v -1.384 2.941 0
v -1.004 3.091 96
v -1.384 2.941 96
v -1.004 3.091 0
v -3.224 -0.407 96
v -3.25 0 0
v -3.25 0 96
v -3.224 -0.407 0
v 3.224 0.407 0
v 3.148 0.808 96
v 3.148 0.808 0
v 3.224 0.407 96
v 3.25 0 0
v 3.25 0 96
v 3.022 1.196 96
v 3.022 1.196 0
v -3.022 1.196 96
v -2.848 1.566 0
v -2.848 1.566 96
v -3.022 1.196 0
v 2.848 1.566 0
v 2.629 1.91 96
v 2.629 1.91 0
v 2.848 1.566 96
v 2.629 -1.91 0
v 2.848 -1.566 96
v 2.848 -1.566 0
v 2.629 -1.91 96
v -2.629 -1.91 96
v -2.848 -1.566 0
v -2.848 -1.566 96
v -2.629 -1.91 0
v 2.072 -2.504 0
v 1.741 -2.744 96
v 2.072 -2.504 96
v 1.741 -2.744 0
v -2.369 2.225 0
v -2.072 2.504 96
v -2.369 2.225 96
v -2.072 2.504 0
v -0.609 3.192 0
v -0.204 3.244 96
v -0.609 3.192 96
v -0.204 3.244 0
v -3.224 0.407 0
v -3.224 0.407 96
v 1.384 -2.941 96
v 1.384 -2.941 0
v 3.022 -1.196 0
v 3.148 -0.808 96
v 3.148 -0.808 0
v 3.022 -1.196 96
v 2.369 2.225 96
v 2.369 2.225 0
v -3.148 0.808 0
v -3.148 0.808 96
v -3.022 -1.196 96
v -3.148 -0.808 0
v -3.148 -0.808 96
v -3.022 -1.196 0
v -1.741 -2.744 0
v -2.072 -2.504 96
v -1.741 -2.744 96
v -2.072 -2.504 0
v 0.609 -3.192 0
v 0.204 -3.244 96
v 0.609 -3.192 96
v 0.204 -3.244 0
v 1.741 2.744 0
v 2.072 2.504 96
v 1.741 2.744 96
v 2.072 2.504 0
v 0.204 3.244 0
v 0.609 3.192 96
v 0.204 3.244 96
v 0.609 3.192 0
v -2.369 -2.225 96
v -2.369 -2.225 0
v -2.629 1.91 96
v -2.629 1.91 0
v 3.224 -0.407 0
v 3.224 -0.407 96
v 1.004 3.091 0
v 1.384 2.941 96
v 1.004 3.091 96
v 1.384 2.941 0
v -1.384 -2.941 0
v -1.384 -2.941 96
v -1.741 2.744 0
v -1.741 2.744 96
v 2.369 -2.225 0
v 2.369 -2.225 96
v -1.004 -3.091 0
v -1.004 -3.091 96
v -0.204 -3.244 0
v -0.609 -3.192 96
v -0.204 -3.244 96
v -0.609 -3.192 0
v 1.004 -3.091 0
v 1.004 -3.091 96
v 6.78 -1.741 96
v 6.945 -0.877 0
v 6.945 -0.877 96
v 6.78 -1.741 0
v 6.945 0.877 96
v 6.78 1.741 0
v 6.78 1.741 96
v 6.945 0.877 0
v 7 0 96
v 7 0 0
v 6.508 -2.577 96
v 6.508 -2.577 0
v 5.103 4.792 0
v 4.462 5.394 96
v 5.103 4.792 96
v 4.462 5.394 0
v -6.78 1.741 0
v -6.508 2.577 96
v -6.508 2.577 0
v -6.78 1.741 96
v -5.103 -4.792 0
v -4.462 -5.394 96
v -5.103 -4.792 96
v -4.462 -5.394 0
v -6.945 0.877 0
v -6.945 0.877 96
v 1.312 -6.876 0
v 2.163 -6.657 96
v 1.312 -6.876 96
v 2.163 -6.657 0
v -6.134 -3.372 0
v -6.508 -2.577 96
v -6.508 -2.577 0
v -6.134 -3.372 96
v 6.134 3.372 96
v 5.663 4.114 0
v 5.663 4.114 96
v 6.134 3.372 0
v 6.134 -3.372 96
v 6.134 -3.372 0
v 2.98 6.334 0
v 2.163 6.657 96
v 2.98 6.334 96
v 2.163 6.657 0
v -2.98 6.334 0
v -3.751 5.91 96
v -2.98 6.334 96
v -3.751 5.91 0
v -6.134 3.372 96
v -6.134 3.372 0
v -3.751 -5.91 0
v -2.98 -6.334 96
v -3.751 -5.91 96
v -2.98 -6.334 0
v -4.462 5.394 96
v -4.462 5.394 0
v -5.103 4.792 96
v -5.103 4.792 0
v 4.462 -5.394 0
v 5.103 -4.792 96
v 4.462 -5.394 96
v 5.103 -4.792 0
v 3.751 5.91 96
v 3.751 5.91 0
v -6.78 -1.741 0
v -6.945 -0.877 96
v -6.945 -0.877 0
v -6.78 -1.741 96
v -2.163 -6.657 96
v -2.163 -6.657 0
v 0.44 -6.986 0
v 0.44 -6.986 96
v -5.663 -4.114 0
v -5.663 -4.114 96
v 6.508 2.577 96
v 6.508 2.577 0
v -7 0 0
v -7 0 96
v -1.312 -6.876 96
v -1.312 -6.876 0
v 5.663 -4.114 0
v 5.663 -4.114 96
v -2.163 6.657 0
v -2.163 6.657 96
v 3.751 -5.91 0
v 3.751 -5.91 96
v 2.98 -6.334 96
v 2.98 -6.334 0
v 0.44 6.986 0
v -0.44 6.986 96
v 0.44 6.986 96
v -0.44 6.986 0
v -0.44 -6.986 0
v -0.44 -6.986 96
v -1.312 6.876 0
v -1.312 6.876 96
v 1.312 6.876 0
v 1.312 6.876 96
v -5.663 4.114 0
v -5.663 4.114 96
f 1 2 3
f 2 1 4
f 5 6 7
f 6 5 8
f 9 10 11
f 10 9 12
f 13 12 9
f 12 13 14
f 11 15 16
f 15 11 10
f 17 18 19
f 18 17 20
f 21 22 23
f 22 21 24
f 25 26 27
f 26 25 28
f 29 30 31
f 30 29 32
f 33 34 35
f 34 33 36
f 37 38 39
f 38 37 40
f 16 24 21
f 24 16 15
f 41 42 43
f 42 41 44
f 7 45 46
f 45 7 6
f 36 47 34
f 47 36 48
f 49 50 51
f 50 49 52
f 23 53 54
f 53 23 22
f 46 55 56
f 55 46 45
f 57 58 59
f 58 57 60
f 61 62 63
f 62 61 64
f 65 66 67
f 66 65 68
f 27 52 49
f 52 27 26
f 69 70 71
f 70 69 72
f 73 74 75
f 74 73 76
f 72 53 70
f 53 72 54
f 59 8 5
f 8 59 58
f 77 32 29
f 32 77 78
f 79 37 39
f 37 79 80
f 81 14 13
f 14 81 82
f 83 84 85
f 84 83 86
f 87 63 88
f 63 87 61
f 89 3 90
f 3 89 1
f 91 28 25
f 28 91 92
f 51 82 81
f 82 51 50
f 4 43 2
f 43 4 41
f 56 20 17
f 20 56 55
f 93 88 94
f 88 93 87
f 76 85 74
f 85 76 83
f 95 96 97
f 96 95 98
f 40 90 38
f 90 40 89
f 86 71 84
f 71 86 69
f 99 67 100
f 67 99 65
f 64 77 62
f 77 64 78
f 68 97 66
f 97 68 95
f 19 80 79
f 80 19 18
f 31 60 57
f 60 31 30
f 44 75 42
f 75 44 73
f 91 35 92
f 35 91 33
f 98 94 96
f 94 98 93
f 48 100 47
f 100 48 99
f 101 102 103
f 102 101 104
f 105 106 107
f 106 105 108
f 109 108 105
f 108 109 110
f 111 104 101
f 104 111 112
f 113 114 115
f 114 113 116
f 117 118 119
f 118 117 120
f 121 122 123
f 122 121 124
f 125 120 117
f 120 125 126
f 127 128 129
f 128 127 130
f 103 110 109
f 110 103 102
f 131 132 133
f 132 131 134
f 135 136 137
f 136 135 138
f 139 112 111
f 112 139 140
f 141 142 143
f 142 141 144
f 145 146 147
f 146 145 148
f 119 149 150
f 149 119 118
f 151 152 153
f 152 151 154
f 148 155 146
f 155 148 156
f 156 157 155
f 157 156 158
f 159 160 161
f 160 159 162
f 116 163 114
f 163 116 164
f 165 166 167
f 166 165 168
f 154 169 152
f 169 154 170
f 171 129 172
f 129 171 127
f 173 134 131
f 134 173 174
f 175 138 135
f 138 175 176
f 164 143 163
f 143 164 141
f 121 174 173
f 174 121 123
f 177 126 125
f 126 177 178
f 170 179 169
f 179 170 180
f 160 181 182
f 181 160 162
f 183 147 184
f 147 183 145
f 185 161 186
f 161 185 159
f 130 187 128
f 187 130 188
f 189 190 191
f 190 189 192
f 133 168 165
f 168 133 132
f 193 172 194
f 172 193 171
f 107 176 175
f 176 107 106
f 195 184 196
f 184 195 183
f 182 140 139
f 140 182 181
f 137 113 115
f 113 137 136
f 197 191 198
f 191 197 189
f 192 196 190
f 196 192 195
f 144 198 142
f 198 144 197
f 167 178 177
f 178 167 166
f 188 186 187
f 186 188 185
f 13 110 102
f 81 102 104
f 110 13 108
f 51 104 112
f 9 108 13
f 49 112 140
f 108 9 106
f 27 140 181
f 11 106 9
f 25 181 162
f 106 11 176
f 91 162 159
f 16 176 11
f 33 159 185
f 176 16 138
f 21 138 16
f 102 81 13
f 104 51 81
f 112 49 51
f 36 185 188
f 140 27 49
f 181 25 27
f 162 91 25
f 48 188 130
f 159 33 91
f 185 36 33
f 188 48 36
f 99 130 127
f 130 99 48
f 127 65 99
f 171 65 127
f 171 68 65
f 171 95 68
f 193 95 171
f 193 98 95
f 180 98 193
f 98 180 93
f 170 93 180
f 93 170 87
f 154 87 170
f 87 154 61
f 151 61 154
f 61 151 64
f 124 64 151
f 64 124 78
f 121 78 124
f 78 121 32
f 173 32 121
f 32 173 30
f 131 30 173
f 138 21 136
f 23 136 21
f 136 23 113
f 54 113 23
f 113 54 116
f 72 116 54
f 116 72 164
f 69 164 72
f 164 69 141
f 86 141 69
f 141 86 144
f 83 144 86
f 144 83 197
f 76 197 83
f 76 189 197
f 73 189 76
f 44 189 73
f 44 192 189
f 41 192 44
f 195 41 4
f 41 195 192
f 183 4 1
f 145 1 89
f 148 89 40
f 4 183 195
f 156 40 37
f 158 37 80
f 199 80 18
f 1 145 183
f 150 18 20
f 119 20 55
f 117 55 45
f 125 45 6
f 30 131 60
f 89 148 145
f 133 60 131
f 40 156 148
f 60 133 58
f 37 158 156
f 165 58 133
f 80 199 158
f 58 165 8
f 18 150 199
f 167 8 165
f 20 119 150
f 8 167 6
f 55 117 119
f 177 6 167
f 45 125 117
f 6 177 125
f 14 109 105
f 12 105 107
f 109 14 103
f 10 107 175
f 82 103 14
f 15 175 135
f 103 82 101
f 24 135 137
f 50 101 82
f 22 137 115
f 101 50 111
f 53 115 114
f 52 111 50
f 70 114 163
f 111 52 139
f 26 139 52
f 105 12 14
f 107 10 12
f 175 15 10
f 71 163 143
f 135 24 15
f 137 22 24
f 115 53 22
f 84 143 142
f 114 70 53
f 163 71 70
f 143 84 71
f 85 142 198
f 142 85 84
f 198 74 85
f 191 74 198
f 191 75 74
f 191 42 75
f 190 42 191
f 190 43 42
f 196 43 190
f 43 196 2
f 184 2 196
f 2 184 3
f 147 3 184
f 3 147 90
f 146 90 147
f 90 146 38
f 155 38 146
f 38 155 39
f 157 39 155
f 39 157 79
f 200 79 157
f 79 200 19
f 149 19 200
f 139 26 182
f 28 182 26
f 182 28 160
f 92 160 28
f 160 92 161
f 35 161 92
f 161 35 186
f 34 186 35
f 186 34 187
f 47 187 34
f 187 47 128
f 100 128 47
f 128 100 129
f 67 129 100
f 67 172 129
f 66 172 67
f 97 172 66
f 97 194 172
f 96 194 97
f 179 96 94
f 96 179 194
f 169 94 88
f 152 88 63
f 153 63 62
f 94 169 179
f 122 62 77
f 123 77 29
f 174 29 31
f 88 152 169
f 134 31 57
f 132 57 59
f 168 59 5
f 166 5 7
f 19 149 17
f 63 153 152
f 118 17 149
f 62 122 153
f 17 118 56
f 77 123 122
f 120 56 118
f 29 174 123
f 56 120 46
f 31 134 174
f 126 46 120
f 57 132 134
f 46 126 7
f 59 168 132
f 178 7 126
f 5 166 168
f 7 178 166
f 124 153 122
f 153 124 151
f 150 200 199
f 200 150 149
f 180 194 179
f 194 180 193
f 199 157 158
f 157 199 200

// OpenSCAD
$fn = 50;


difference() {
	union() {
		*color(alpha = 1.0000000000, c = "gray") {
			translate(v = [0, 7, 0]) {
				linear_extrude(height = 1) {
					text(font = "Arial:style=Bold", halign = "center", size = 4.5000000000, text = "COMMENT plate main", valign = "center");
				}
			}
		}
		cylinder(h = 96, r = 7.0000000000);
	}
	union() {
		*color(alpha = 1.0000000000, c = "gray") {
			translate(v = [0, 7, 0]) {
				linear_extrude(height = 1) {
					text(font = "Arial:style=Bold", halign = "center", size = 4.5000000000, text = "COMMENT holes main", valign = "center");
				}
			}
		}
		translate(v = [0, 0, -100]) {
			cylinder(h = 200, r = 3.2500000000);
		}
		translate(v = [0, 0, -100]) {
			cylinder(h = 200, r = 1.8000000000);
		}
	}
}
